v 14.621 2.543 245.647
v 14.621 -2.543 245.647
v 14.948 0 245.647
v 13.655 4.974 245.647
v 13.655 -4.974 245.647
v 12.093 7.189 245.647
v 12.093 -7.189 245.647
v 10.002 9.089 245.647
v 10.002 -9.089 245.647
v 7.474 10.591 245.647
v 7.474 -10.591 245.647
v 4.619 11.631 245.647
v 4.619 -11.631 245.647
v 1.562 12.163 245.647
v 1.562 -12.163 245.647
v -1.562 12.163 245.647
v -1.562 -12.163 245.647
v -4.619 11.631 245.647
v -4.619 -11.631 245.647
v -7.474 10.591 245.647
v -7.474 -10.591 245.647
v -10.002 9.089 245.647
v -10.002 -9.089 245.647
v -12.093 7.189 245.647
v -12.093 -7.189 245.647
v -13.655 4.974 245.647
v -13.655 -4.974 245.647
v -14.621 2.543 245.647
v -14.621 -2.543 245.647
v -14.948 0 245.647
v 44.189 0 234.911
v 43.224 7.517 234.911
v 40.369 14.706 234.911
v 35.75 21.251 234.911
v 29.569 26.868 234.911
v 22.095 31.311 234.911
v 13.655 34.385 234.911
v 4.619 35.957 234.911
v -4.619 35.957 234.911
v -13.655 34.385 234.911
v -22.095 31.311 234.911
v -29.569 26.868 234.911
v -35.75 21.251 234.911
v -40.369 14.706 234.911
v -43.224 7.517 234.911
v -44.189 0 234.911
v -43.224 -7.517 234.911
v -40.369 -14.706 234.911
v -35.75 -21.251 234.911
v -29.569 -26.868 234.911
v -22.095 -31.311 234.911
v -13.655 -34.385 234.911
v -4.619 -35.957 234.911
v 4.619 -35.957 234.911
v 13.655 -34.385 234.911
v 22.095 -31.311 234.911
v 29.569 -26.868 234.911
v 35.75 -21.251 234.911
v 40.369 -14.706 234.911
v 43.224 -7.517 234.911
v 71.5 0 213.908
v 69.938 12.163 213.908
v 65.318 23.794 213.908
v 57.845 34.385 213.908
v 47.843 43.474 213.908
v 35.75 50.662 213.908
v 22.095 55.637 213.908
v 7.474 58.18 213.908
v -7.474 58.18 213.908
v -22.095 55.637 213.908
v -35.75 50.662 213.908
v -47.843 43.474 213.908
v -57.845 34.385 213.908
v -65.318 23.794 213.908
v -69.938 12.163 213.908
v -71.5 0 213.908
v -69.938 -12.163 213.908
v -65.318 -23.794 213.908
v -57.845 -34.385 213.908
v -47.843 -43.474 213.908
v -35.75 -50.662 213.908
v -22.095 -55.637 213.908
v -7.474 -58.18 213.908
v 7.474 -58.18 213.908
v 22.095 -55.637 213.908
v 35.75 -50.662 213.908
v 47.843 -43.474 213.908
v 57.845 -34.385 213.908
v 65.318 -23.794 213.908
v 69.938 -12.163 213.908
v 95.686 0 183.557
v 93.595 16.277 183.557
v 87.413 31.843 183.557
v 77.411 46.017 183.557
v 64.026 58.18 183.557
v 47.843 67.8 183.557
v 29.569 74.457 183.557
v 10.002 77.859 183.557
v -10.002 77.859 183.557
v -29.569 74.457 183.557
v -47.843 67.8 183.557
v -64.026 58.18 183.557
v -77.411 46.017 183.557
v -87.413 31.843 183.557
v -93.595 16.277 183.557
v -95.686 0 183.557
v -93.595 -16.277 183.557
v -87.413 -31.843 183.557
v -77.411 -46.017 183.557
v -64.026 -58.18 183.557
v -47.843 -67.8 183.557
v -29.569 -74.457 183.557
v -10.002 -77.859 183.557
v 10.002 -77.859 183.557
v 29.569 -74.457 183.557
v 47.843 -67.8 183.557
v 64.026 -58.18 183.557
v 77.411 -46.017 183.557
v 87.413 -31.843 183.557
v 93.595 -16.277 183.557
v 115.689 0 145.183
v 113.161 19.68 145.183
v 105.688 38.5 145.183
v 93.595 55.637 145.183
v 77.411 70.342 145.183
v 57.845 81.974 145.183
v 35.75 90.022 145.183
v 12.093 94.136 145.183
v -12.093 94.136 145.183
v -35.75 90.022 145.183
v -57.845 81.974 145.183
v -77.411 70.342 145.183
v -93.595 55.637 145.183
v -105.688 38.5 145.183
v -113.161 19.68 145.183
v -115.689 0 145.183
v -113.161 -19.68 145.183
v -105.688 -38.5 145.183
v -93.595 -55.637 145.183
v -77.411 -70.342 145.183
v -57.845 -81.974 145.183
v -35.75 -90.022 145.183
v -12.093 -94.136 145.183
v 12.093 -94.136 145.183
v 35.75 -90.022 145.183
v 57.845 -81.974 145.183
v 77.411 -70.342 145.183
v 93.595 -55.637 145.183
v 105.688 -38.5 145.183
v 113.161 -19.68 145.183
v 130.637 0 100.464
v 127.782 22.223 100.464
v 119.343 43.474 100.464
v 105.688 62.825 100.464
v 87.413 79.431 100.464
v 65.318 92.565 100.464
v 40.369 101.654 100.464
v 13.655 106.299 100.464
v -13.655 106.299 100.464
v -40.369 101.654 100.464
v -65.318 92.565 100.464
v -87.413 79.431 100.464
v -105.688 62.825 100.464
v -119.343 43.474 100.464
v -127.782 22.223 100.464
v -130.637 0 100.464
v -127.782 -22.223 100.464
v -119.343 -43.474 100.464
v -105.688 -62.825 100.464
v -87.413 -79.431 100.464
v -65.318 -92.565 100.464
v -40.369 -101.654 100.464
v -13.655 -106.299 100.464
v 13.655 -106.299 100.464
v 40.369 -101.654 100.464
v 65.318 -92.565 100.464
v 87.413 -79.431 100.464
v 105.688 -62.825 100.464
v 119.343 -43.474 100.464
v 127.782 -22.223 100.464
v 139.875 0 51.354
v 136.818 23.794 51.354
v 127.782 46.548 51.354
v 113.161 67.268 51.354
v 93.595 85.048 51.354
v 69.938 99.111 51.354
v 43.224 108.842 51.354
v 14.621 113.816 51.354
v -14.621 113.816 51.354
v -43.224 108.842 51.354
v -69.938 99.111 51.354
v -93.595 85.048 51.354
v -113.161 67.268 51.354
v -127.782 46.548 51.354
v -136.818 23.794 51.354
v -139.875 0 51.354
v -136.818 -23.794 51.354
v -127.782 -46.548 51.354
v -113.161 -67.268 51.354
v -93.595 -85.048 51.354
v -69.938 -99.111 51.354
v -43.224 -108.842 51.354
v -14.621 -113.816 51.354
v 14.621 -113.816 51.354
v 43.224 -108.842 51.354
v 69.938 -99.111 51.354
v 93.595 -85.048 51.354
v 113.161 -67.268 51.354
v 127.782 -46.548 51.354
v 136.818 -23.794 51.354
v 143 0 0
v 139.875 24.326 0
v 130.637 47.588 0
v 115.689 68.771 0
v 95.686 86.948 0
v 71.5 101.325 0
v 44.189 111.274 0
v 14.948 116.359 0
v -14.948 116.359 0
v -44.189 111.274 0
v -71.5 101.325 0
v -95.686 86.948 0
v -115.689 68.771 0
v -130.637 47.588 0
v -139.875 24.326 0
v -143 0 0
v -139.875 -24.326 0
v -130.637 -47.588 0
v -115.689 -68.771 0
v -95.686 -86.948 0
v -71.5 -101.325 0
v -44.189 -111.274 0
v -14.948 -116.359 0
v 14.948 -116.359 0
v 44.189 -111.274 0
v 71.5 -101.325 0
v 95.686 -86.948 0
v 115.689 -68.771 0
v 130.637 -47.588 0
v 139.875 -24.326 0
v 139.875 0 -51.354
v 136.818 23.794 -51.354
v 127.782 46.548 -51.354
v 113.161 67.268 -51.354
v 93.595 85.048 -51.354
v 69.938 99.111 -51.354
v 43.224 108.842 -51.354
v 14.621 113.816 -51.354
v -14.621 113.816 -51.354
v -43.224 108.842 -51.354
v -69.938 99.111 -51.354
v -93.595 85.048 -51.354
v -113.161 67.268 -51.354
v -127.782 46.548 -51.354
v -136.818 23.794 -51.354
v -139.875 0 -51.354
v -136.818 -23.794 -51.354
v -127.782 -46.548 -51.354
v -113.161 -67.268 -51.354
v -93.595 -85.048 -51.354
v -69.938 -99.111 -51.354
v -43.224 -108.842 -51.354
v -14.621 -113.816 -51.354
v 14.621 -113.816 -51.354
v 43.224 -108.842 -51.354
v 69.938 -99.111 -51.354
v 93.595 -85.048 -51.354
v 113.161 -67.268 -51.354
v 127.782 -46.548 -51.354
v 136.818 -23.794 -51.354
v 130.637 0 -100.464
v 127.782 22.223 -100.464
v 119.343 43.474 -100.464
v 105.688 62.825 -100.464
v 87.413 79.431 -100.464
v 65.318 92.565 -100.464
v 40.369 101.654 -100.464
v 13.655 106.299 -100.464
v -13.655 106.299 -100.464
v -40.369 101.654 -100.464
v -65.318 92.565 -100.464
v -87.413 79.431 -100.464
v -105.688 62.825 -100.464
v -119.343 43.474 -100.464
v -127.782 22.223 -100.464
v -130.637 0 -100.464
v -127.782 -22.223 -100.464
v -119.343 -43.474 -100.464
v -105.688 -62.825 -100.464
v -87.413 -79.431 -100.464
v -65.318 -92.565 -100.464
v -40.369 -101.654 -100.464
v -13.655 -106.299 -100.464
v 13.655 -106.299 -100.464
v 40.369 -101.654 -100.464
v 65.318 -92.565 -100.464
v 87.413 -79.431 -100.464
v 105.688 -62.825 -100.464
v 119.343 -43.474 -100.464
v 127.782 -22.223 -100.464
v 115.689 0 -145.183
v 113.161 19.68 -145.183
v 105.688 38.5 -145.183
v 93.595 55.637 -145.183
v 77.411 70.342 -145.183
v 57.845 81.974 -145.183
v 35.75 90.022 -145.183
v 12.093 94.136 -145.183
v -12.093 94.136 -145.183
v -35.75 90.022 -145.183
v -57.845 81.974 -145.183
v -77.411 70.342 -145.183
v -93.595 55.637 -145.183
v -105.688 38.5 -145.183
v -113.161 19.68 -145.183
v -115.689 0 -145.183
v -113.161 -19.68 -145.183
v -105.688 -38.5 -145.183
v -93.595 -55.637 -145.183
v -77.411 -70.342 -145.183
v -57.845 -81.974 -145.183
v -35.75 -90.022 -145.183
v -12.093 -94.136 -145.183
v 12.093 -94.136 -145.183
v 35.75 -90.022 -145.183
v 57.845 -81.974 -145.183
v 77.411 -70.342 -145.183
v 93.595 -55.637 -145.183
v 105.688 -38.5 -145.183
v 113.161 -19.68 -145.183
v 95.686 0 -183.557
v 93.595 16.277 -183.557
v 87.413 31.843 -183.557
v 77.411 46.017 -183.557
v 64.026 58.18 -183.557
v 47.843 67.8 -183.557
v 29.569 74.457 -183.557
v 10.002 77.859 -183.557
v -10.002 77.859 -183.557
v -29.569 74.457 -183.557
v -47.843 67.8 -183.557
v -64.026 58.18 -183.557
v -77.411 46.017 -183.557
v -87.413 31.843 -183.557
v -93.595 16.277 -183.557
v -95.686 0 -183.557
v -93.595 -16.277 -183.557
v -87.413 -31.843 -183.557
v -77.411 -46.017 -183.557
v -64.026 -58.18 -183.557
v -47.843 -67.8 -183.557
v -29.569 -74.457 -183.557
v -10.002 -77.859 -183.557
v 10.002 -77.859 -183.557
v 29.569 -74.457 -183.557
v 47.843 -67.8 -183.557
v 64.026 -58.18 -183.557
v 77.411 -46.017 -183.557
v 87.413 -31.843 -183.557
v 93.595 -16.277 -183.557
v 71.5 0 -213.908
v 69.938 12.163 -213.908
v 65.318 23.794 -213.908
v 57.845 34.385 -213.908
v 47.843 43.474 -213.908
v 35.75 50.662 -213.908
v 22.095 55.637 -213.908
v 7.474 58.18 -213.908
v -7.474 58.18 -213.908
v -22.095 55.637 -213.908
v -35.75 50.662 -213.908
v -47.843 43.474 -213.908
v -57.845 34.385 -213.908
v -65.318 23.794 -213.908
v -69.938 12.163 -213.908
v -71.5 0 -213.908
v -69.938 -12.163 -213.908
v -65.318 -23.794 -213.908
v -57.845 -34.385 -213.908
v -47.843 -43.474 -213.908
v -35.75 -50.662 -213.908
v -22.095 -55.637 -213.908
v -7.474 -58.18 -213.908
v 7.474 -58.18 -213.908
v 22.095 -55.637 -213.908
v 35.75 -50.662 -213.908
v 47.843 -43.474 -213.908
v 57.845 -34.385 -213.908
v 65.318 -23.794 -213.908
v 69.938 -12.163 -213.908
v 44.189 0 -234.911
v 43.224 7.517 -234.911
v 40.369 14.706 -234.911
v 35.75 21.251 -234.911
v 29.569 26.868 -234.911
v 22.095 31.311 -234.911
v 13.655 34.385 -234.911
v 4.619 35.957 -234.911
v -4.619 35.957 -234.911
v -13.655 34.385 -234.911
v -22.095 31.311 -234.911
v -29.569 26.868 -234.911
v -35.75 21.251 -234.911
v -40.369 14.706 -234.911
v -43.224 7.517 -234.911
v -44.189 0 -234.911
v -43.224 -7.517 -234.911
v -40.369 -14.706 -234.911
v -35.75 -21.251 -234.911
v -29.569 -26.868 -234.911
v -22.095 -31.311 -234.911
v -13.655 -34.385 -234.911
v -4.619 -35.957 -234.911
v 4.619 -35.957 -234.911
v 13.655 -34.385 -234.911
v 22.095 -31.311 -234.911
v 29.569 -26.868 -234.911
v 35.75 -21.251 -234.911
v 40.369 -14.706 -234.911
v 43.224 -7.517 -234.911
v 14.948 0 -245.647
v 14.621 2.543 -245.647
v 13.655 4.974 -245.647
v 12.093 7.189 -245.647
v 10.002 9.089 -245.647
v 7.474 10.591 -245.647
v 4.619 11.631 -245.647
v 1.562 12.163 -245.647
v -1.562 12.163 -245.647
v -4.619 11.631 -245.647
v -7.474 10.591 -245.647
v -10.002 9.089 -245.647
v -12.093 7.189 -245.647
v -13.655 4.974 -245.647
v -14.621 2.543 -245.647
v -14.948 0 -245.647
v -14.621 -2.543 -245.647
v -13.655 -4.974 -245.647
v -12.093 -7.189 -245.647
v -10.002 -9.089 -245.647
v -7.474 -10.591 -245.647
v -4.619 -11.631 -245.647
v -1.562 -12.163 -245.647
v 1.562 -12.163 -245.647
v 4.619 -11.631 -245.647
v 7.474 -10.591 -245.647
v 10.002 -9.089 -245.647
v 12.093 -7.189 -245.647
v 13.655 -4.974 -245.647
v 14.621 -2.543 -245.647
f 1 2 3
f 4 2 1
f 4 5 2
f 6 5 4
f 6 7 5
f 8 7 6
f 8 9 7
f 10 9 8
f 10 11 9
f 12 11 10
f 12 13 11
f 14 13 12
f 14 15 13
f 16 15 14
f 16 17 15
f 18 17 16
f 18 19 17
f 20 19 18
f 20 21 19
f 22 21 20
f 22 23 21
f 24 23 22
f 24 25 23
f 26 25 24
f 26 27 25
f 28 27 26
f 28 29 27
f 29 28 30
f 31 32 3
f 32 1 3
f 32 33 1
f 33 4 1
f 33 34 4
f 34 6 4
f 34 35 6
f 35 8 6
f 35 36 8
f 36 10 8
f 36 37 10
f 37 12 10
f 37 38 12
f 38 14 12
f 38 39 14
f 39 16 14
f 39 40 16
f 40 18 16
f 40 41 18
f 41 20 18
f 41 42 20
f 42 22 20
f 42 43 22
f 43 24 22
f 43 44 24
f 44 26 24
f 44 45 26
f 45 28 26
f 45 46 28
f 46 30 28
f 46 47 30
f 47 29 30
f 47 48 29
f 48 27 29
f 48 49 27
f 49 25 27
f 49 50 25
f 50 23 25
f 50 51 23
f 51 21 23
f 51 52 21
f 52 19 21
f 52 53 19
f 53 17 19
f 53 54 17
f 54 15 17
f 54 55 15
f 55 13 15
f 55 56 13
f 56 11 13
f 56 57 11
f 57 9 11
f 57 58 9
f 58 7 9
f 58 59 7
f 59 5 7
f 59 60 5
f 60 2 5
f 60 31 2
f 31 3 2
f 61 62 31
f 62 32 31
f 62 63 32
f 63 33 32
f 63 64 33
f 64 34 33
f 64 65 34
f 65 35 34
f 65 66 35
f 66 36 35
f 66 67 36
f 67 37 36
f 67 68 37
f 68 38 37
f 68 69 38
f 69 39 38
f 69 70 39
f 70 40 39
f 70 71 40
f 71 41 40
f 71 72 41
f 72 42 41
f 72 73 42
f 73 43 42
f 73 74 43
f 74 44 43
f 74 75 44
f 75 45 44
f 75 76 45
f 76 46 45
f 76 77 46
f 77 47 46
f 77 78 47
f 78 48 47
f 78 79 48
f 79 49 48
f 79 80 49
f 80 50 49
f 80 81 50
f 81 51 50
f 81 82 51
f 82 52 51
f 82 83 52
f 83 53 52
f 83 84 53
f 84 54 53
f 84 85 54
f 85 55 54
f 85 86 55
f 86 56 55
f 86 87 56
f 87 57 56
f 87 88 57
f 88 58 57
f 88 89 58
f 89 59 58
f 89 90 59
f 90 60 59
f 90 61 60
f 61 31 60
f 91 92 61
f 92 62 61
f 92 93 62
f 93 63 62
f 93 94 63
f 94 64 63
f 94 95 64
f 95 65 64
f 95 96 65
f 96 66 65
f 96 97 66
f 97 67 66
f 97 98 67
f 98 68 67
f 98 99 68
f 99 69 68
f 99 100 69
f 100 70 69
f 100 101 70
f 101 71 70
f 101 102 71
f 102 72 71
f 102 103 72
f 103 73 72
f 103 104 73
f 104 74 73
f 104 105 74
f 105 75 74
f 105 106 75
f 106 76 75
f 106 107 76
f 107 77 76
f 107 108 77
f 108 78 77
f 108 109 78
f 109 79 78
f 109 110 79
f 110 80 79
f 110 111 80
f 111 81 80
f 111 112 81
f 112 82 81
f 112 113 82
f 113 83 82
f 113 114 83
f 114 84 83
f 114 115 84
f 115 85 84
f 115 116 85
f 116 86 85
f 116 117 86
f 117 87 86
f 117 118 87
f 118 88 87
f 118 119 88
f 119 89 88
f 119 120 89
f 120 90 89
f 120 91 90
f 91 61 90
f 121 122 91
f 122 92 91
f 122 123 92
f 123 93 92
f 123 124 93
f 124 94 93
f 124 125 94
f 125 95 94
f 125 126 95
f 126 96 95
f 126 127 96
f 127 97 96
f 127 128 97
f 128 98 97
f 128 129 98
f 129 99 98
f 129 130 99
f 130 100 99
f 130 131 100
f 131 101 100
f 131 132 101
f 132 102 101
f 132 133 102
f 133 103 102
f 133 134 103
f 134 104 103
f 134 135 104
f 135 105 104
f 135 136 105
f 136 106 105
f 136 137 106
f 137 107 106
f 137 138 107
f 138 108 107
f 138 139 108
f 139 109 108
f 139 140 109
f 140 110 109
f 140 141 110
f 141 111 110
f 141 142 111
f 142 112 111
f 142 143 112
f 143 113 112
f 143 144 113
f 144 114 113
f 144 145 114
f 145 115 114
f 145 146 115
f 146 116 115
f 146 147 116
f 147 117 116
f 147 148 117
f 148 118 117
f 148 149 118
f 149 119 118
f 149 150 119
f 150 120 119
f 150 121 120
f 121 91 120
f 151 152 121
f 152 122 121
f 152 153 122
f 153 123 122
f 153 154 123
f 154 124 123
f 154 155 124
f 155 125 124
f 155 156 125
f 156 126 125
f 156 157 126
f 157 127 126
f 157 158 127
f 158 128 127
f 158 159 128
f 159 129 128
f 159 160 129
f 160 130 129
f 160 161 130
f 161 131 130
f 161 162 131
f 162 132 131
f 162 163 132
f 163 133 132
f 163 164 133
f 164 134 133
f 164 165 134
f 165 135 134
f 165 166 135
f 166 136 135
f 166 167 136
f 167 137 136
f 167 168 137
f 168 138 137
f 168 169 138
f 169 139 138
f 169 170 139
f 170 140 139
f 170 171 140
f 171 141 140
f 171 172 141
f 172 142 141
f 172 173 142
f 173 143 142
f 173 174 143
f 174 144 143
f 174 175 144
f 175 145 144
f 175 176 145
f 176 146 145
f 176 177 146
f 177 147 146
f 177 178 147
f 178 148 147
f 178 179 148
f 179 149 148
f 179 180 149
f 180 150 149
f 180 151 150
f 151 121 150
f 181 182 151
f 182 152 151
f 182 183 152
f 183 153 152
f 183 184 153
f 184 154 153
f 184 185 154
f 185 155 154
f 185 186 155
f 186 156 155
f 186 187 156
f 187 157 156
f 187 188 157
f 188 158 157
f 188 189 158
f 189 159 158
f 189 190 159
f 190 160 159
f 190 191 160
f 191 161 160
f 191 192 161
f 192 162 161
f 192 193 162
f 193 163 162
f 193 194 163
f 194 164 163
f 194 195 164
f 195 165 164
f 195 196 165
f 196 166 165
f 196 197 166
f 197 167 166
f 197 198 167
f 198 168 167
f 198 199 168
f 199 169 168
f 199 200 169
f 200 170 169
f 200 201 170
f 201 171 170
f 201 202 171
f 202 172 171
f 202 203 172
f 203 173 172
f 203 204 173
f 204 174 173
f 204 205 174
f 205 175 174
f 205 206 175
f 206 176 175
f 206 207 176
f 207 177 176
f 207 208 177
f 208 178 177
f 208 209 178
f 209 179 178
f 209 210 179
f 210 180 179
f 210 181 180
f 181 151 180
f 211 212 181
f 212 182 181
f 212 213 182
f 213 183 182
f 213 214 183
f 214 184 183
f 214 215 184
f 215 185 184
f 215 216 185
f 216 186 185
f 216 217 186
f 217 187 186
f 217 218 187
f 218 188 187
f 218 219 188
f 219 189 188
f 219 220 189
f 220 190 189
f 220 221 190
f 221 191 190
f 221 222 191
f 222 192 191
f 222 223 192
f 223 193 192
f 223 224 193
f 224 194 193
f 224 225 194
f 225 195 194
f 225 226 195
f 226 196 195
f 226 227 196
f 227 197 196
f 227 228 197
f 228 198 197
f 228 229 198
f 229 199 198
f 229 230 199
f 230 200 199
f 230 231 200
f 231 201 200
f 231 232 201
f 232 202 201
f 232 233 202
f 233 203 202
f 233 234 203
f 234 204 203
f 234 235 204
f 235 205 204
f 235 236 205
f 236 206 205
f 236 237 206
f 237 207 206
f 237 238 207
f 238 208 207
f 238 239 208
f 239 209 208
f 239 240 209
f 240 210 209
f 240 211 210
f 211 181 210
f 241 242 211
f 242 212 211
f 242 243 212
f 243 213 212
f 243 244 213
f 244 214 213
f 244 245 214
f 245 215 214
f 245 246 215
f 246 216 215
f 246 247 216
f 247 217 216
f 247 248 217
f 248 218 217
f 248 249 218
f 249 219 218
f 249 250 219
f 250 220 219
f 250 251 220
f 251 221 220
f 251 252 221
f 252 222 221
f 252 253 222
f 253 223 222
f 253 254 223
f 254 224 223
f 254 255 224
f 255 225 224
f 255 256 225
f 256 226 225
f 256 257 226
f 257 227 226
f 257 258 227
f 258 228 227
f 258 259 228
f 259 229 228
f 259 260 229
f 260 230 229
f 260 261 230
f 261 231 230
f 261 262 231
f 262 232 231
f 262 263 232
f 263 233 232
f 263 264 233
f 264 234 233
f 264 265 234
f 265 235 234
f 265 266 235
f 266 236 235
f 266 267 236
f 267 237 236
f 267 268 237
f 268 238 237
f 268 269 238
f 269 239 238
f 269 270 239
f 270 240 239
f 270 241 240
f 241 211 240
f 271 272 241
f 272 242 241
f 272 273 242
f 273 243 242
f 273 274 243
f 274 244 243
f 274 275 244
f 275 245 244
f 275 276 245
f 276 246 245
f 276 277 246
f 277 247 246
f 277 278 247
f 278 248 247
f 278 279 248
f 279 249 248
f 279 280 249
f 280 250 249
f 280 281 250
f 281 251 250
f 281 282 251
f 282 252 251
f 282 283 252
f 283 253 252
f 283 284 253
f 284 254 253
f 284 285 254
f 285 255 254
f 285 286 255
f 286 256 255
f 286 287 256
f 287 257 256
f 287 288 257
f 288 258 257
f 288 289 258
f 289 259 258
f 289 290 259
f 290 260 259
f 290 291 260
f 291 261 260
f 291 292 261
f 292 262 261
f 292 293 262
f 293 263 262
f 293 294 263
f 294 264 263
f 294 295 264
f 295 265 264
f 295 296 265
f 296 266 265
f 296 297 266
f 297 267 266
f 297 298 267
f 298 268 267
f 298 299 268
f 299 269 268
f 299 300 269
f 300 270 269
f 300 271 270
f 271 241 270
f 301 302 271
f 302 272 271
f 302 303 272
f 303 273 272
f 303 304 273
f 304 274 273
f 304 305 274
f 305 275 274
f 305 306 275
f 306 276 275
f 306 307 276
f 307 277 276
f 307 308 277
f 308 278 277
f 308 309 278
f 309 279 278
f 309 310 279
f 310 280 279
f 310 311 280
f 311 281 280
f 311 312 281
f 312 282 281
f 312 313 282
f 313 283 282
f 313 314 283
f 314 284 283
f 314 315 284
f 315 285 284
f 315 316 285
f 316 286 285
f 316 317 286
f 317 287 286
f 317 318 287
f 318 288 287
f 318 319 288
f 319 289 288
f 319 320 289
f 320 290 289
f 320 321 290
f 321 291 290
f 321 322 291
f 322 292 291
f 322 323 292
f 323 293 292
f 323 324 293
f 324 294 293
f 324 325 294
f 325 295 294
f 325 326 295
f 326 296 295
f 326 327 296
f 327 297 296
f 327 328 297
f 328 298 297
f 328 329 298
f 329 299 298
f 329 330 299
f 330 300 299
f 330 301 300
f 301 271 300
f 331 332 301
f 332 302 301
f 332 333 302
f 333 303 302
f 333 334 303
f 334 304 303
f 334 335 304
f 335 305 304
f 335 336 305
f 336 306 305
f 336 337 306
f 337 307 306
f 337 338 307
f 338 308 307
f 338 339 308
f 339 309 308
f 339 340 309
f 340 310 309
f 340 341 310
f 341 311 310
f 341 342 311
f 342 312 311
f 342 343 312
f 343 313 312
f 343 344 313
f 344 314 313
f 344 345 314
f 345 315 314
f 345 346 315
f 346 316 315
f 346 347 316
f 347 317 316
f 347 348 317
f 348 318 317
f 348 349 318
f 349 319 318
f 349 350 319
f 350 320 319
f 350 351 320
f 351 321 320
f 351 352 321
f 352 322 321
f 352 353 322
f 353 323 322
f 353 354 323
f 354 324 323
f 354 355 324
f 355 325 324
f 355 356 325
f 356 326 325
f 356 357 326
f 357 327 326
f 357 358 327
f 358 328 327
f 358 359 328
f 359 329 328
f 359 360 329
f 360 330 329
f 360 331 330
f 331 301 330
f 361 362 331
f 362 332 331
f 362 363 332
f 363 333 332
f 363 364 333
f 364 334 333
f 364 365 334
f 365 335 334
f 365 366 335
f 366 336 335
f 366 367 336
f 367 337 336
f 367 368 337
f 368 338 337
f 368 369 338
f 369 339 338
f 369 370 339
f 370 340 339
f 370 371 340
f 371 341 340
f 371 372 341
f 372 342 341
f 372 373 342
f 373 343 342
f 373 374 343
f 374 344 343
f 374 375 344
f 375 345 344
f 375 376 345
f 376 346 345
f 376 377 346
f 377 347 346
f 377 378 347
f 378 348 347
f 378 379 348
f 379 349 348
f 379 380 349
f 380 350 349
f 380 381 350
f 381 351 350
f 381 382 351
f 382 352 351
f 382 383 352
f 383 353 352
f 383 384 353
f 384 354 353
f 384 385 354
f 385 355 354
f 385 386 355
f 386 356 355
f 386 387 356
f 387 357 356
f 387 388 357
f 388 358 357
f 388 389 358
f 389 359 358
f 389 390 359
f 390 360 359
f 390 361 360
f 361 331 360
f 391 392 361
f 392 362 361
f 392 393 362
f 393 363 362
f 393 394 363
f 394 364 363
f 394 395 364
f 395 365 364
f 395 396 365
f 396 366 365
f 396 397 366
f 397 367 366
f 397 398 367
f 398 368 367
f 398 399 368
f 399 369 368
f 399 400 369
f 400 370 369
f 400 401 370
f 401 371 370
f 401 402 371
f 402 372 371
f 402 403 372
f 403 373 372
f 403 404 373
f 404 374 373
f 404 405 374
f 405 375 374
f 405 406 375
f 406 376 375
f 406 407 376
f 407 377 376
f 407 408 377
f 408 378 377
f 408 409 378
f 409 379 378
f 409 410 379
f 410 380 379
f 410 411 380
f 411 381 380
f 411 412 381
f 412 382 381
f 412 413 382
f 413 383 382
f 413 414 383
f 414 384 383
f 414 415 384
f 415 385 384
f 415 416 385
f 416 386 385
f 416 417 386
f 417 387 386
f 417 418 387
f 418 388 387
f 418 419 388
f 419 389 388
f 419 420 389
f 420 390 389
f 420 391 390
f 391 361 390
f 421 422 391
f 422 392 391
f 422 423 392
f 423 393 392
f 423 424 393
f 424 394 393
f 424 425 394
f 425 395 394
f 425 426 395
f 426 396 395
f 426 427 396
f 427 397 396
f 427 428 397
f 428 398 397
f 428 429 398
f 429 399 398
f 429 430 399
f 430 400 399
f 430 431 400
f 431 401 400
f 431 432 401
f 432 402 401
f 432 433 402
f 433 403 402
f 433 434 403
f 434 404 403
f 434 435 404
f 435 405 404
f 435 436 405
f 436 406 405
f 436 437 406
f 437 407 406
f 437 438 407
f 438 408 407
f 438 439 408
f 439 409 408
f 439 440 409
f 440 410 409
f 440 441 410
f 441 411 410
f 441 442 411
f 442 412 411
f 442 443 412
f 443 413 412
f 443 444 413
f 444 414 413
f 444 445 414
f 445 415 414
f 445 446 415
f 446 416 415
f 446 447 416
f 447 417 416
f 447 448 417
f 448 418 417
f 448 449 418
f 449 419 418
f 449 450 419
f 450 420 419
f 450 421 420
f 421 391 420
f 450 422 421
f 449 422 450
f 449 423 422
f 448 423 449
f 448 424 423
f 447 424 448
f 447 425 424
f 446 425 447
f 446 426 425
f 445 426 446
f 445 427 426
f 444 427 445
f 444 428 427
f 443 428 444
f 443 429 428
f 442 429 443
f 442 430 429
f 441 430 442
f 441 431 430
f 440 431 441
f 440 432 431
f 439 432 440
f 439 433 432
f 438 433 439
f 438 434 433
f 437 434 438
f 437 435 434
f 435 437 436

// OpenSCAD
// Generated by SolidPython 1.0.1 on 2020-07-29 00:46:49


scale(v = [11, 9, 19]) {
	sphere(r = 13);
}
/***********************************************
*********      SolidPython code:      **********
************************************************
 
# import packages: SolidPython
from solid import *
from solid.utils import *
from itertools import chain, combinations, permutations


class Resize:

    def __init__(self, scad_file):
        self.scad_file = scad_file
        #self.scad_file = import_scad(scad_file)
        # cone/cylinder param:
        self.r1 = 0
        self.r2 = 0
        self.h = 0
        # rectangular prism param:
        self.w = 0
        self.l = 0
        # ellipse param:
        self.r = 0

    # import OpenScad code (file name corresponds to shape)


    # classify shape + parameters
    def assign(self, param1, param2, param3):
        if self.scad_file == 'cone.scad':
            self.r1 = param1
            self.r2 = param2
            self.h = param3
        elif self.scad_file == 'cylinder.scad':
            self.r1 = param1
            self.r2 = param2
            self.h = param3
        elif self.scad_file == 'rectangularPrism.scad':
            self.h = param1
            self.l = param2
            self.w = param3
        else:
            self.r = param1
            self.h = param2

    # resize parameters
    def iterate(self):
        x = range(3, 20, 2)
        i = 1
        if self.scad_file == 'cone.scad':
            tempList = list(permutations(x, 2))
            for temp in tempList:
                param1 = temp[0]
                param2 = temp[1]
                filepath = 'produced_scad_files/' + 'cone' + str(param1) + '_' + str(param2) + '_' + '.scad'
                scad_render_to_file(cylinder(h=param1, r1=param2, r2=0), filepath)

        elif self.scad_file == 'cylinder.scad':
            tempList = list(permutations(x, 3))
            for temp in tempList:
                param1 = temp[0]
                param2 = temp[1]
                filepath = 'produced_scad_files/' + 'cylinder' + str(param1) + '_' + str(param2) + '_' + '.scad'
                scad_render_to_file(cylinder(h=param1, r1=param2, r2=param2), filepath)

        elif self.scad_file == 'rectangularPrism.scad':
            tempList = list(permutations(x, 3))
            for temp in tempList:
                param1 = temp[0]
                param2 = temp[1]
                param3 = temp[2]
                filepath = 'produced_scad_files/' + 'rectangularPrism' + str(param1) + '_' + str(param2) + '_' + str(
                    param3) + '.scad'
                scad_render_to_file(cube(size=(param1, param2, param3)), filepath)

        elif self.scad_file == 'ellipse.scad':
            tempList = list(permutations(x, 4))
            for temp in tempList:
                param1 = temp[0]
                param2 = temp[1]
                param3 = temp[2]
                param4 = temp[3]
                filepath = 'produced_scad_files/' + 'ellipse' + str(param1) + '_' + str(param2) + '_' + str(param3) + '_' + str(param4) + '.scad'
                scad_render_to_file(scale([param1, param2, param3])(sphere(r=param4)), filepath)

    def render_to_scadfile(self):
        scad_render_to_file(scad, 'example.scad') 
 
************************************************/
